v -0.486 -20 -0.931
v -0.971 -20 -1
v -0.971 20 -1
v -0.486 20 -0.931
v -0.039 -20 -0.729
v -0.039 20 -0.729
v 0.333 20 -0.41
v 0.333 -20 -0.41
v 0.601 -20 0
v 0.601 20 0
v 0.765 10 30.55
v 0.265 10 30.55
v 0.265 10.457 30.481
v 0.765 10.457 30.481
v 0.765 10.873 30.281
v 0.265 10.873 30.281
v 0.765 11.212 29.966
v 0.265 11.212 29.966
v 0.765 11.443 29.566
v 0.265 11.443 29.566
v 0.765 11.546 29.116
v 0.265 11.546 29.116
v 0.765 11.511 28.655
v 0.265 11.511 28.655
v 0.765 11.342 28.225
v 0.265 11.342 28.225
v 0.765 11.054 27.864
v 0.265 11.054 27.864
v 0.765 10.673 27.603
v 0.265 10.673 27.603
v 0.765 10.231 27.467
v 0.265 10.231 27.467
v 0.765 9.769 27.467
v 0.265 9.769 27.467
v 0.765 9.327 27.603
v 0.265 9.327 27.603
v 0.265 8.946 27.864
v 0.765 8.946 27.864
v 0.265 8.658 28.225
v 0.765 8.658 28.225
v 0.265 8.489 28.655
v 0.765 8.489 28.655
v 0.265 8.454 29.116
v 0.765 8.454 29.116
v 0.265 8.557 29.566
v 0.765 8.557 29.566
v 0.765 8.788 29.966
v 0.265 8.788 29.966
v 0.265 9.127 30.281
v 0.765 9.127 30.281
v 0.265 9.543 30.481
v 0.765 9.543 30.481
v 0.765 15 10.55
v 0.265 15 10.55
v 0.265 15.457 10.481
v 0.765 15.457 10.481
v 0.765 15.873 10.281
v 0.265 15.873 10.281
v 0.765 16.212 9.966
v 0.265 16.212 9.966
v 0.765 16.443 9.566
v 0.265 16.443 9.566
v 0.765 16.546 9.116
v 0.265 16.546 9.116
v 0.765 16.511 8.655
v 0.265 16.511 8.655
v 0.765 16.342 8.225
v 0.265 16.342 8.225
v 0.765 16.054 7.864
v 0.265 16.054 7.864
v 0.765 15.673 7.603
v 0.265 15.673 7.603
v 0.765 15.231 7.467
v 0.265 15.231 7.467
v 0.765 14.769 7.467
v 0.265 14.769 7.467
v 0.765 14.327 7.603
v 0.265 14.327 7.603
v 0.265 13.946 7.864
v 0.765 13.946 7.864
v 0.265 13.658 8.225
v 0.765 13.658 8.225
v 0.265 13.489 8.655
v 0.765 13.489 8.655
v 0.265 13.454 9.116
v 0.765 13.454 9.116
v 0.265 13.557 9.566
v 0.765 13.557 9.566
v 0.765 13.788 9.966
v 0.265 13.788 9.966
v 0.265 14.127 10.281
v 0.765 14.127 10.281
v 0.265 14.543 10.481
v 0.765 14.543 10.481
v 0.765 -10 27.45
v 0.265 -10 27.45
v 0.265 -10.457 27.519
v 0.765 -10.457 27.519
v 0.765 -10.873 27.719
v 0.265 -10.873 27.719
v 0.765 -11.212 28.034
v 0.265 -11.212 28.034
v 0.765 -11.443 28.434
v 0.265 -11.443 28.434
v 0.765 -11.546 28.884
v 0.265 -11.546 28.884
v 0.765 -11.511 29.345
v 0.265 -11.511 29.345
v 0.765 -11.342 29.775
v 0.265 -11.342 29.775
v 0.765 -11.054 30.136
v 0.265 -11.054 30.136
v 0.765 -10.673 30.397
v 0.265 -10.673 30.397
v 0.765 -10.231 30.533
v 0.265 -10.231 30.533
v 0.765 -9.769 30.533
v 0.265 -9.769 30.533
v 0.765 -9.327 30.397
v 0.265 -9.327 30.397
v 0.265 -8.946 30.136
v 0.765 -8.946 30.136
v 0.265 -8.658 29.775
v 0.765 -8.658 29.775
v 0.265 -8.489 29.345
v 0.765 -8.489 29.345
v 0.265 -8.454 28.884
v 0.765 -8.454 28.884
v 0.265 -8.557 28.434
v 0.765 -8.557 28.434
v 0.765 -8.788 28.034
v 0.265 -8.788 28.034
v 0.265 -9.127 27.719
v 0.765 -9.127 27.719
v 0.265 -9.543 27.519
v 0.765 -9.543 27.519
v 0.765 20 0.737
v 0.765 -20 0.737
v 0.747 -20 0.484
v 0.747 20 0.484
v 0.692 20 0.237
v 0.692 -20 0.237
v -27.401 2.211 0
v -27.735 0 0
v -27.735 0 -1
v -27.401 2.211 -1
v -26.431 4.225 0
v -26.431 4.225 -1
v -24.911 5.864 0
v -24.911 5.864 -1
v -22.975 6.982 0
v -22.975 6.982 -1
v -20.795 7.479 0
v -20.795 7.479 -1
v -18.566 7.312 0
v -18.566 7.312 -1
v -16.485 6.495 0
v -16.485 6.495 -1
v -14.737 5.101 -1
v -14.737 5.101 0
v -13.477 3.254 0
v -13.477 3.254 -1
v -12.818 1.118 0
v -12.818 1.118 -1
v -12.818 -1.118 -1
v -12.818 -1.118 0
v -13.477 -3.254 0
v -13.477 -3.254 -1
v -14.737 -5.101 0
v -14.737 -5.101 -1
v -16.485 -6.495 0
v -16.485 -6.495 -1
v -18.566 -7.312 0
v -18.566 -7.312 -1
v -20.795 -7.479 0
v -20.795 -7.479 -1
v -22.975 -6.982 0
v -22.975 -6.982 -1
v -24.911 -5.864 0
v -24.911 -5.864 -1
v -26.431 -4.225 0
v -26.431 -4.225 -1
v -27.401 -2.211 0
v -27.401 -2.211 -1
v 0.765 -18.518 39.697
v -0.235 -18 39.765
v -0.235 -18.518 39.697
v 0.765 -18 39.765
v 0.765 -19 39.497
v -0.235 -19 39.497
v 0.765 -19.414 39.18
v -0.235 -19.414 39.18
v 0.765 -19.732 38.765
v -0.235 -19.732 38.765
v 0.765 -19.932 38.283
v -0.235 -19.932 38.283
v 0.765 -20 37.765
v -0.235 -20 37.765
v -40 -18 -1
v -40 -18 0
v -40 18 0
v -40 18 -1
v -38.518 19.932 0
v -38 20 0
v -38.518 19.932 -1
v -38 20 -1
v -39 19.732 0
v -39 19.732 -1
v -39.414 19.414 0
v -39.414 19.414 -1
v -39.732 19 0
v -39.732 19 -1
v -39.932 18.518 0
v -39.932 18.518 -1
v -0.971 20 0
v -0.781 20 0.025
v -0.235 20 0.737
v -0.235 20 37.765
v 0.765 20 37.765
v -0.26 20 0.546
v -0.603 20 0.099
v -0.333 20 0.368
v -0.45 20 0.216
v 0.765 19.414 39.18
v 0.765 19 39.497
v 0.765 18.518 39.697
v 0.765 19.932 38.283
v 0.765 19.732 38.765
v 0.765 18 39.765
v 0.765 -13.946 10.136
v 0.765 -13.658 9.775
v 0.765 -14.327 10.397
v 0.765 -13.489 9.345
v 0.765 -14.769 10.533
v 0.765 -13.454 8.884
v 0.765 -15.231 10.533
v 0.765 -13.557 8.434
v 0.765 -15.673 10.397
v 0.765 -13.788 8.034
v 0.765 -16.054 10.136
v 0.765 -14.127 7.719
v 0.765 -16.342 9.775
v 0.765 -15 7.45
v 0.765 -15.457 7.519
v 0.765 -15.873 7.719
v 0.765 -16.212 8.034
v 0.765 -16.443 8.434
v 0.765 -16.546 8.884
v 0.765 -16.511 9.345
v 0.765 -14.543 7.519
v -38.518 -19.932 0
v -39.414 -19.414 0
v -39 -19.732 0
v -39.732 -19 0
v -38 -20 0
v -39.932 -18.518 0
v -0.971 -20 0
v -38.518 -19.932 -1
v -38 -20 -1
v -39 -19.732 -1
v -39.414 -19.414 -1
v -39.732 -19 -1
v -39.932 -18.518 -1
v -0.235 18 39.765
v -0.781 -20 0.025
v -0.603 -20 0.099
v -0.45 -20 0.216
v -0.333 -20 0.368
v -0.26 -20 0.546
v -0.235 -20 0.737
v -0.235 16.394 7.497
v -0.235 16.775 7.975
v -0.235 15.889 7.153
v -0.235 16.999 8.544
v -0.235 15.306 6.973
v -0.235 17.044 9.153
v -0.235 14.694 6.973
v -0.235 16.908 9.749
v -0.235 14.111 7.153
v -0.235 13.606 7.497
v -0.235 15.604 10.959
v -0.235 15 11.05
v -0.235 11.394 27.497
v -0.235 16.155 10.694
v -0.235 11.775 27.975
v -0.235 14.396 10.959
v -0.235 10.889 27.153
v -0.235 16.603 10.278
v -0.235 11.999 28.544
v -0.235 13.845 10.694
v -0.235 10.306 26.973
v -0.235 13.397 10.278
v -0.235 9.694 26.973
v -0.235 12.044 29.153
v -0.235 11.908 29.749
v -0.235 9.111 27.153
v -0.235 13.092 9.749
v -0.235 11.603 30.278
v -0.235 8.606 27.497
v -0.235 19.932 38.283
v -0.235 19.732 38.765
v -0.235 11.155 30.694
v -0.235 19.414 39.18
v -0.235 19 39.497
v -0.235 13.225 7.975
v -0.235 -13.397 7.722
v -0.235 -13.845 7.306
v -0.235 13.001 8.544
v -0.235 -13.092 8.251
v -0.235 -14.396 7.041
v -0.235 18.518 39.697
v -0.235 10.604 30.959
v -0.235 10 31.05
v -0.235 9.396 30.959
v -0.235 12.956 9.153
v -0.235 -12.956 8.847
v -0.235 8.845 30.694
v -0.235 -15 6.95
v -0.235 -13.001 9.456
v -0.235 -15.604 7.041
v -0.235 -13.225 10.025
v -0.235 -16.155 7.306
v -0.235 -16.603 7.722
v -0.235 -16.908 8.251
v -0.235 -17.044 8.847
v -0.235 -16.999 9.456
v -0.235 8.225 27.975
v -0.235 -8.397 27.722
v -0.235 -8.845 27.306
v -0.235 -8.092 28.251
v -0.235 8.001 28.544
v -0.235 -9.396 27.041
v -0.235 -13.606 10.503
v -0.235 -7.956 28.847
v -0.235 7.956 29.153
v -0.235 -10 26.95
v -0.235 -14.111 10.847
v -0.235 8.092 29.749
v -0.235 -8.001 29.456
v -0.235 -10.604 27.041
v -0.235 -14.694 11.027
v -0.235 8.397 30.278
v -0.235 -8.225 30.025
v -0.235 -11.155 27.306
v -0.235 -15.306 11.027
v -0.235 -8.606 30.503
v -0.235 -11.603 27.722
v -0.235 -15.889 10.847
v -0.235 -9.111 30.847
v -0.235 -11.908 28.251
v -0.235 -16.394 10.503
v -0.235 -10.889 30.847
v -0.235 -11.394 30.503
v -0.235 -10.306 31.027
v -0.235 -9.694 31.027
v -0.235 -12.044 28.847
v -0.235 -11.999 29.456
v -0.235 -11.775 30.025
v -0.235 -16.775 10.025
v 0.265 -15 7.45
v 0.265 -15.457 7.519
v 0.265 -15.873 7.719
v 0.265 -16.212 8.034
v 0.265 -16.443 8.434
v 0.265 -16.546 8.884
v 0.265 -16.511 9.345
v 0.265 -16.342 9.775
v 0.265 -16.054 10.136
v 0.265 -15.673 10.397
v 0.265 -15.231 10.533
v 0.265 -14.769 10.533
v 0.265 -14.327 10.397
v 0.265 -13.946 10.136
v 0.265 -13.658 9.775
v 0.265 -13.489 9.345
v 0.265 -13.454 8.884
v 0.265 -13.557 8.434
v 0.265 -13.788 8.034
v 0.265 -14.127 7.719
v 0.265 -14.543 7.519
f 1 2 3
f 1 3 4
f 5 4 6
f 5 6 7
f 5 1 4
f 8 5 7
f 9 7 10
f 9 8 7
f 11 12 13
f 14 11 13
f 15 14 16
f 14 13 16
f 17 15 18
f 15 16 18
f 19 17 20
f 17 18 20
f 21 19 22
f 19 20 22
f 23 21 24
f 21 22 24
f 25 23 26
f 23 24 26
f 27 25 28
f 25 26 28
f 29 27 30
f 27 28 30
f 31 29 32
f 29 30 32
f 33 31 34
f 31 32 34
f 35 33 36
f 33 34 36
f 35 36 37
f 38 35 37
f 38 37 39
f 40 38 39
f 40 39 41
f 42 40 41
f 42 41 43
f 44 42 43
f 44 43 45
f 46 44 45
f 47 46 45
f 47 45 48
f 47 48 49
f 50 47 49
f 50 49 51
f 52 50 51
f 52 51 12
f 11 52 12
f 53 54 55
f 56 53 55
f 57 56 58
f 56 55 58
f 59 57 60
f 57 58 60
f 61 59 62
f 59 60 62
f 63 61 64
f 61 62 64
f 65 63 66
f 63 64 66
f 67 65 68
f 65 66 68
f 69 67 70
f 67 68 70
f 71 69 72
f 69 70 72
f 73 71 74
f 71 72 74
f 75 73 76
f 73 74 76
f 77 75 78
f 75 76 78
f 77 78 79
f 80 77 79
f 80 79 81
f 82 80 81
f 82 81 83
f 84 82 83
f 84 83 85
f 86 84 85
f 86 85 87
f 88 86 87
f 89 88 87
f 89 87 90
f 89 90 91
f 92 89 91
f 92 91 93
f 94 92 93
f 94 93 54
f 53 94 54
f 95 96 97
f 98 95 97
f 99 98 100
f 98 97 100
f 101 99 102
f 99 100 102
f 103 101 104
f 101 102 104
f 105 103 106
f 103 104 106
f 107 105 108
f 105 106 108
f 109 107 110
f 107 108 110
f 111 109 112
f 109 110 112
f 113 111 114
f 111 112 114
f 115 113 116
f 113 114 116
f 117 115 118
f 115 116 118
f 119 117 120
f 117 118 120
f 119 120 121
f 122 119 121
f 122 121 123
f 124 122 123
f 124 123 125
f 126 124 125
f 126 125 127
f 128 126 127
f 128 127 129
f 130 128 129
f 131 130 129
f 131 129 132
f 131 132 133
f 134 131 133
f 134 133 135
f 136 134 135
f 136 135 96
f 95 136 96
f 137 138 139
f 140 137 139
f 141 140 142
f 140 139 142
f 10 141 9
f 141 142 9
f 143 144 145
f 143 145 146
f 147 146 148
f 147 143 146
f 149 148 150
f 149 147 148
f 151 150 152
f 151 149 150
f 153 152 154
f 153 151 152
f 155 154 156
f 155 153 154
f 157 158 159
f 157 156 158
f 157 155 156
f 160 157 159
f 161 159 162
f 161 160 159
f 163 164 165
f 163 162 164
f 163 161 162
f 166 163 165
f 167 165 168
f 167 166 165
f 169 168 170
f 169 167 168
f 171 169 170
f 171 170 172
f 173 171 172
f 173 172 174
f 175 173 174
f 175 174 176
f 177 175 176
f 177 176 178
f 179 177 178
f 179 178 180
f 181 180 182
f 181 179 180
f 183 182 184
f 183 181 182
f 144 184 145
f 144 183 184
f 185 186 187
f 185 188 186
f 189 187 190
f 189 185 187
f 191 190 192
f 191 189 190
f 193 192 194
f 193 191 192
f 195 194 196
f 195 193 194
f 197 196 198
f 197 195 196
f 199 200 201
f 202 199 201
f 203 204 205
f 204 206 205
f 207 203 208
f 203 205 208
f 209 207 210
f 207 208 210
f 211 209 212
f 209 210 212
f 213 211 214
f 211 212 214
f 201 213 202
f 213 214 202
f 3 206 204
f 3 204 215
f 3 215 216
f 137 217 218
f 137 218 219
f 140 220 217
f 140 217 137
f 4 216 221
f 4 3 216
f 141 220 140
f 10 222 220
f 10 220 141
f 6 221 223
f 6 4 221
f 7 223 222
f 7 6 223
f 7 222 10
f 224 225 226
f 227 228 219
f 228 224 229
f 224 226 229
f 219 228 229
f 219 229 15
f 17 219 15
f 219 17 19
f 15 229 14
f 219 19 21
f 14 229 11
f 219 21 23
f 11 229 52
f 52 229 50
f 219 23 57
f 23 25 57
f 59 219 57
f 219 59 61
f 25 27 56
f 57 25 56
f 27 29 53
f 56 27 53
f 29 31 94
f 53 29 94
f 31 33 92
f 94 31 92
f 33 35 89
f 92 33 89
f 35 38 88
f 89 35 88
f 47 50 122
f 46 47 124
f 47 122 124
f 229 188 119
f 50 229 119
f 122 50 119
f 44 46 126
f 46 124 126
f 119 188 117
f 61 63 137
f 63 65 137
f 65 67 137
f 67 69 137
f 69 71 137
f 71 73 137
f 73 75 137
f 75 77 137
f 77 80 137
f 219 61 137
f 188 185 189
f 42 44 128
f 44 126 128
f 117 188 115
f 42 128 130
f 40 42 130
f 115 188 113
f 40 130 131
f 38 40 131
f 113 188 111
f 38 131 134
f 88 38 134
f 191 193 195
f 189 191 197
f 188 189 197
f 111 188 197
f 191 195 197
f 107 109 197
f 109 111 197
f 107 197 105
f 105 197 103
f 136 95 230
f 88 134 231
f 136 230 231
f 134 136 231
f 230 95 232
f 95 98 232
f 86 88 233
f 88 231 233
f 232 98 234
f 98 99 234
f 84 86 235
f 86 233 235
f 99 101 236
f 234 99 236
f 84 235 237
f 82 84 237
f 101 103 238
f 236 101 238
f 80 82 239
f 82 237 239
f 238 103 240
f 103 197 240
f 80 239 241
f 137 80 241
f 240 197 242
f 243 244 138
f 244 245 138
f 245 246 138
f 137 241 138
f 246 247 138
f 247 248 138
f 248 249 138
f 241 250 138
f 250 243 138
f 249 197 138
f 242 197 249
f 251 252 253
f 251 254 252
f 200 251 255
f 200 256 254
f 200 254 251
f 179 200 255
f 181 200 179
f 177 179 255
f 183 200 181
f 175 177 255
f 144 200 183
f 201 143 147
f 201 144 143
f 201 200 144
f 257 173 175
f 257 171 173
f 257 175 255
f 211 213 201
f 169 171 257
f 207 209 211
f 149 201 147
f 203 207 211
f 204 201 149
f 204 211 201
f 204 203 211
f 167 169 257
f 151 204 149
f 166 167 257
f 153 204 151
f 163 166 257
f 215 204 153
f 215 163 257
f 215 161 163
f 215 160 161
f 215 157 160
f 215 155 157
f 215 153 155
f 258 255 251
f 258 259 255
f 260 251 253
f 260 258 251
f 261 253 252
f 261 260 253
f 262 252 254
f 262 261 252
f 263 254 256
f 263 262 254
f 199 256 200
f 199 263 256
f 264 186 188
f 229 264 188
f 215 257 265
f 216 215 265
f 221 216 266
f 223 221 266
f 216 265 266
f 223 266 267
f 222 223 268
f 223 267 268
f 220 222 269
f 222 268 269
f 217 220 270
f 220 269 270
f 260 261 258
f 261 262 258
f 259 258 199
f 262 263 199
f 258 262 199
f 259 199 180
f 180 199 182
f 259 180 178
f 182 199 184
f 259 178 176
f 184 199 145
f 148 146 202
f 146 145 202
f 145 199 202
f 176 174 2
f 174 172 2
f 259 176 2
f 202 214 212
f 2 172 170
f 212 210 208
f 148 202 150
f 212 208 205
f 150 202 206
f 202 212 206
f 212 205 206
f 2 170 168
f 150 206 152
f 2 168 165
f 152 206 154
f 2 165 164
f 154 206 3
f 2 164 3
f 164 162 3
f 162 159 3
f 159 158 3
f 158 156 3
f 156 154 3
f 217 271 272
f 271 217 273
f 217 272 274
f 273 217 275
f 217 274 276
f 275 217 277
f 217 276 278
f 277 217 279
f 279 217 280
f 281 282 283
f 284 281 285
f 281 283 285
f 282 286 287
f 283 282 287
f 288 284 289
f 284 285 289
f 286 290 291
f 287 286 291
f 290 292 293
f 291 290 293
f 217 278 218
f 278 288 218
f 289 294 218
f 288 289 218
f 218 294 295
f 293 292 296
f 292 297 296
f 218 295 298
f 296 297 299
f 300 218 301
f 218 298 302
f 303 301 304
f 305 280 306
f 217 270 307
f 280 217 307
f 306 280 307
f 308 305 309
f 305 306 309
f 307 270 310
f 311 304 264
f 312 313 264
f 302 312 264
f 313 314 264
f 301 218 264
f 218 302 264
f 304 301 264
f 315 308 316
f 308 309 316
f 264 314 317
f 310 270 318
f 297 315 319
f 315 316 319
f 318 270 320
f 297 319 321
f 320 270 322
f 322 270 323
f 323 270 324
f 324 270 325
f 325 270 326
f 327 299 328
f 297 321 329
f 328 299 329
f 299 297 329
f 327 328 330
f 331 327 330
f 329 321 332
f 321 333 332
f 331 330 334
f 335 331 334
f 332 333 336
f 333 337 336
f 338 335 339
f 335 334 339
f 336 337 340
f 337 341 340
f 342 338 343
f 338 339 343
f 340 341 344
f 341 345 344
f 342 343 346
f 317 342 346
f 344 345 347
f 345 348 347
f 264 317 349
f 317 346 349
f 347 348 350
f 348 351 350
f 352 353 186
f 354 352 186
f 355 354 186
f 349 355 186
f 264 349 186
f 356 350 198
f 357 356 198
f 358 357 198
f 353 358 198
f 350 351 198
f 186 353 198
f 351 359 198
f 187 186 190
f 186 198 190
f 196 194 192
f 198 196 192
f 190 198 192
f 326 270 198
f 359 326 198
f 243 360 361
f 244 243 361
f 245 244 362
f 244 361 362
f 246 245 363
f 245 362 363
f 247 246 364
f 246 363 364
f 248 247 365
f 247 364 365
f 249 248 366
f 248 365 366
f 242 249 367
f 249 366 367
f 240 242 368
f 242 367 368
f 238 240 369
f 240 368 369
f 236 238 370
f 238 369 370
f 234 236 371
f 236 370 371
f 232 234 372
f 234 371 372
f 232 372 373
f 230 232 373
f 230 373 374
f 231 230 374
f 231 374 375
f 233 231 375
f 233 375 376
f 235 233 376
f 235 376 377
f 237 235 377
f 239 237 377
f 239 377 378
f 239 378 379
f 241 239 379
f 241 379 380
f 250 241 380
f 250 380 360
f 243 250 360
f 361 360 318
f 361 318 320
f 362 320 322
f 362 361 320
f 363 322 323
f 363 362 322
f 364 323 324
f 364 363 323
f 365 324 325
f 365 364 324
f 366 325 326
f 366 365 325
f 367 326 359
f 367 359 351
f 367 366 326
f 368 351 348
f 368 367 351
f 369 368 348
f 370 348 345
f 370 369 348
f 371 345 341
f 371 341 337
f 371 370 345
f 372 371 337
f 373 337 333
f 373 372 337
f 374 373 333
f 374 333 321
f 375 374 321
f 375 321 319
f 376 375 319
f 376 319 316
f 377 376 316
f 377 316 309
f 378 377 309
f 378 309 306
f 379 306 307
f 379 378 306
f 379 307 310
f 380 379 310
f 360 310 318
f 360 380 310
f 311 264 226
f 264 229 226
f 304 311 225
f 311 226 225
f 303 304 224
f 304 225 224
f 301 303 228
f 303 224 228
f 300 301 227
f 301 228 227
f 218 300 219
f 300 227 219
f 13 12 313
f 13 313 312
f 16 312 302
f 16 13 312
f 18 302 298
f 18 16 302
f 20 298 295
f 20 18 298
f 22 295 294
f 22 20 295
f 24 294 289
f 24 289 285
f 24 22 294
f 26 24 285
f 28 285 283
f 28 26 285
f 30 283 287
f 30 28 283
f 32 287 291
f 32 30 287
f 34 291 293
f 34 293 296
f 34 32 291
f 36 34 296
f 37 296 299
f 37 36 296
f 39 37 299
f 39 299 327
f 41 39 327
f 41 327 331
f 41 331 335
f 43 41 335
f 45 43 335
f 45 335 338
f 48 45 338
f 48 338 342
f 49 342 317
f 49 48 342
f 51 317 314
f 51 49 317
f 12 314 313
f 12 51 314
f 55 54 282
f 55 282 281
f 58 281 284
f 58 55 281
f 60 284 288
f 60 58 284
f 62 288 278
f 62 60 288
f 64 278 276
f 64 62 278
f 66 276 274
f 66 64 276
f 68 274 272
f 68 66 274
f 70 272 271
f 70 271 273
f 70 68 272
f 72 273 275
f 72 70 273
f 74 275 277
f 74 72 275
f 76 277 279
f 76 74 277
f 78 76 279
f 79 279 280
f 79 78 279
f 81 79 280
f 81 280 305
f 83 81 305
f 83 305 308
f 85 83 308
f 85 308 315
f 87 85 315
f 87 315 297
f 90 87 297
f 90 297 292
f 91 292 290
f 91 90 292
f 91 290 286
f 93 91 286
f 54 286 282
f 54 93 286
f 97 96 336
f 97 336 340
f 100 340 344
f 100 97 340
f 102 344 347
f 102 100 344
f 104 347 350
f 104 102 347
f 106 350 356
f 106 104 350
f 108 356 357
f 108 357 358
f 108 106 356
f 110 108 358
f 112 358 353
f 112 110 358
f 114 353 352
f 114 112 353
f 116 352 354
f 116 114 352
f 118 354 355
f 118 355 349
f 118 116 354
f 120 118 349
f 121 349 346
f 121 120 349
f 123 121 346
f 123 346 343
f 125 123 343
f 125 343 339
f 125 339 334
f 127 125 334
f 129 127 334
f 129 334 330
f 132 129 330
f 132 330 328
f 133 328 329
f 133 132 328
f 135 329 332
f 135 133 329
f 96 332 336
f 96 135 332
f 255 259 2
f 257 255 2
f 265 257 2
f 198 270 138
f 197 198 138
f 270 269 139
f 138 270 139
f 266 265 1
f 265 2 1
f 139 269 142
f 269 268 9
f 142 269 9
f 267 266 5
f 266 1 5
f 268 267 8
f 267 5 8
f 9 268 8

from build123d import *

# Parameters (mm, degrees)
SKETCH1_W               = 80
SKETCH1_H               = 40
BASE_FLANGE1_DEPTH      = 1
SKETCHED_START          = -20
SKETCHED_BEND1_DEPTH    = 40
SKETCHED_BEND1_2_DEPTH  = 40
FILLET1_R               = 2
SKETCH9_R               = 1.55
CUT_EXTRUDE1_DEPTH      = 60.687271317
CUT_EXTRUDE3_DEPTH      = 61.512940202
CUT_EXTRUDE3_DEPTH_BACK = 61.512940202
SKETCH10_R              = 7.5
CHAMFER1_SIZE           = 0.5


# Read off the part's stored shape, not the designer's step: Sketched Bend1
# Sheet-metal steps are written as plain solids
with BuildPart() as part:
    # Sketch1 → Base-Flange1 (new body)
    with BuildSketch(Plane.XY):
        Rectangle(SKETCH1_W, SKETCH1_H)
    extrude(amount=-BASE_FLANGE1_DEPTH)

    # Sketched Bend1 outline → Sketched Bend1 (cut)
    with BuildSketch(Plane(origin=(0, 0, 0), x_dir=(1, 0, 0), z_dir=(0, 1, 0)).offset(SKETCHED_START)):
        with BuildLine():
            ThreePointArc((-0.971223369, 1), (-0.039397205, 0.728828115), (0.601417721, 0))
            Line((0.601417721, 0), (40, 0))
            Line((40, 0), (40, 1))
            Line((40, 1), (-0.971223369, 1))
        make_face()
    extrude(amount=SKETCHED_BEND1_DEPTH, mode=Mode.SUBTRACT)

    # Sketched Bend1 2 outline → Sketched Bend1 2 (add)
    with BuildSketch(Plane(origin=(0, 0, 0), x_dir=(1, 0, 0), z_dir=(0, 1, 0)).offset(SKETCHED_START)):
        with BuildLine():
            Line((-0.234623369, -0.7366), (-0.234623369, -39.765376631))
            Line((-0.234623369, -39.765376631), (0.765376631, -39.765376631))
            Line((0.765376631, -39.765376631), (0.765376631, -0.7366))
            ThreePointArc((0.765376631, -0.7366), (0.723891388, -0.359286442), (0.601417721, 0))
            Line((0.601417721, 0), (-0.971223369, 0))
            ThreePointArc((-0.971223369, 0), (-0.450368514, -0.215745145), (-0.234623369, -0.7366))
        make_face()
    extrude(amount=SKETCHED_BEND1_2_DEPTH)

    # Fillet1
    fillet1_edges = [part.edges().sort_by_distance(p)[0] for p in [
        (-40, -20, -0.5),
        (-40, 20, -0.5),
        (0.265376631, -20, 39.765376631),
        (0.265376631, 20, 39.765376631),
    ]]
    fillet(fillet1_edges, radius=FILLET1_R)

    # Sketch9 → Cut-Extrude1 (cut, through all)
    with BuildSketch(Plane.ZY.offset(0.234623369)):
        with Locations((9, 15)):
            Circle(SKETCH9_R)
        with Locations((29, 10)):
            Circle(SKETCH9_R)
        with Locations(Location((29, -10, 0), (0, 0, 180))):
            Circle(SKETCH9_R)
        with Locations(Location((9, -15, 0), (0, 0, 180))):
            Circle(SKETCH9_R)
    extrude(amount=-CUT_EXTRUDE1_DEPTH, mode=Mode.SUBTRACT)

    # Sketch10 → Cut-Extrude3 (cut, two sides: drawn at the far end of the back side and taken through both)
    with BuildSketch(Plane(origin=(0, 0, -1), x_dir=(-1, 0, 0), z_dir=(0, 0, -1)).offset(-CUT_EXTRUDE3_DEPTH_BACK)):
        with Locations((20.234623369, 0)):
            Circle(SKETCH10_R)
    extrude(amount=CUT_EXTRUDE3_DEPTH + CUT_EXTRUDE3_DEPTH_BACK, mode=Mode.SUBTRACT)

    # Chamfer1
    chamfer1_edges = [part.edges().sort_by_distance(p)[0] for p in [
        (-0.234623369, 15, 7.45),
        (-0.234623369, 10, 27.45),
        (-0.234623369, -10, 30.55),
        (-0.234623369, -15, 10.55),
    ]]
    chamfer(chamfer1_edges, length=CHAMFER1_SIZE)


solid = part.part
